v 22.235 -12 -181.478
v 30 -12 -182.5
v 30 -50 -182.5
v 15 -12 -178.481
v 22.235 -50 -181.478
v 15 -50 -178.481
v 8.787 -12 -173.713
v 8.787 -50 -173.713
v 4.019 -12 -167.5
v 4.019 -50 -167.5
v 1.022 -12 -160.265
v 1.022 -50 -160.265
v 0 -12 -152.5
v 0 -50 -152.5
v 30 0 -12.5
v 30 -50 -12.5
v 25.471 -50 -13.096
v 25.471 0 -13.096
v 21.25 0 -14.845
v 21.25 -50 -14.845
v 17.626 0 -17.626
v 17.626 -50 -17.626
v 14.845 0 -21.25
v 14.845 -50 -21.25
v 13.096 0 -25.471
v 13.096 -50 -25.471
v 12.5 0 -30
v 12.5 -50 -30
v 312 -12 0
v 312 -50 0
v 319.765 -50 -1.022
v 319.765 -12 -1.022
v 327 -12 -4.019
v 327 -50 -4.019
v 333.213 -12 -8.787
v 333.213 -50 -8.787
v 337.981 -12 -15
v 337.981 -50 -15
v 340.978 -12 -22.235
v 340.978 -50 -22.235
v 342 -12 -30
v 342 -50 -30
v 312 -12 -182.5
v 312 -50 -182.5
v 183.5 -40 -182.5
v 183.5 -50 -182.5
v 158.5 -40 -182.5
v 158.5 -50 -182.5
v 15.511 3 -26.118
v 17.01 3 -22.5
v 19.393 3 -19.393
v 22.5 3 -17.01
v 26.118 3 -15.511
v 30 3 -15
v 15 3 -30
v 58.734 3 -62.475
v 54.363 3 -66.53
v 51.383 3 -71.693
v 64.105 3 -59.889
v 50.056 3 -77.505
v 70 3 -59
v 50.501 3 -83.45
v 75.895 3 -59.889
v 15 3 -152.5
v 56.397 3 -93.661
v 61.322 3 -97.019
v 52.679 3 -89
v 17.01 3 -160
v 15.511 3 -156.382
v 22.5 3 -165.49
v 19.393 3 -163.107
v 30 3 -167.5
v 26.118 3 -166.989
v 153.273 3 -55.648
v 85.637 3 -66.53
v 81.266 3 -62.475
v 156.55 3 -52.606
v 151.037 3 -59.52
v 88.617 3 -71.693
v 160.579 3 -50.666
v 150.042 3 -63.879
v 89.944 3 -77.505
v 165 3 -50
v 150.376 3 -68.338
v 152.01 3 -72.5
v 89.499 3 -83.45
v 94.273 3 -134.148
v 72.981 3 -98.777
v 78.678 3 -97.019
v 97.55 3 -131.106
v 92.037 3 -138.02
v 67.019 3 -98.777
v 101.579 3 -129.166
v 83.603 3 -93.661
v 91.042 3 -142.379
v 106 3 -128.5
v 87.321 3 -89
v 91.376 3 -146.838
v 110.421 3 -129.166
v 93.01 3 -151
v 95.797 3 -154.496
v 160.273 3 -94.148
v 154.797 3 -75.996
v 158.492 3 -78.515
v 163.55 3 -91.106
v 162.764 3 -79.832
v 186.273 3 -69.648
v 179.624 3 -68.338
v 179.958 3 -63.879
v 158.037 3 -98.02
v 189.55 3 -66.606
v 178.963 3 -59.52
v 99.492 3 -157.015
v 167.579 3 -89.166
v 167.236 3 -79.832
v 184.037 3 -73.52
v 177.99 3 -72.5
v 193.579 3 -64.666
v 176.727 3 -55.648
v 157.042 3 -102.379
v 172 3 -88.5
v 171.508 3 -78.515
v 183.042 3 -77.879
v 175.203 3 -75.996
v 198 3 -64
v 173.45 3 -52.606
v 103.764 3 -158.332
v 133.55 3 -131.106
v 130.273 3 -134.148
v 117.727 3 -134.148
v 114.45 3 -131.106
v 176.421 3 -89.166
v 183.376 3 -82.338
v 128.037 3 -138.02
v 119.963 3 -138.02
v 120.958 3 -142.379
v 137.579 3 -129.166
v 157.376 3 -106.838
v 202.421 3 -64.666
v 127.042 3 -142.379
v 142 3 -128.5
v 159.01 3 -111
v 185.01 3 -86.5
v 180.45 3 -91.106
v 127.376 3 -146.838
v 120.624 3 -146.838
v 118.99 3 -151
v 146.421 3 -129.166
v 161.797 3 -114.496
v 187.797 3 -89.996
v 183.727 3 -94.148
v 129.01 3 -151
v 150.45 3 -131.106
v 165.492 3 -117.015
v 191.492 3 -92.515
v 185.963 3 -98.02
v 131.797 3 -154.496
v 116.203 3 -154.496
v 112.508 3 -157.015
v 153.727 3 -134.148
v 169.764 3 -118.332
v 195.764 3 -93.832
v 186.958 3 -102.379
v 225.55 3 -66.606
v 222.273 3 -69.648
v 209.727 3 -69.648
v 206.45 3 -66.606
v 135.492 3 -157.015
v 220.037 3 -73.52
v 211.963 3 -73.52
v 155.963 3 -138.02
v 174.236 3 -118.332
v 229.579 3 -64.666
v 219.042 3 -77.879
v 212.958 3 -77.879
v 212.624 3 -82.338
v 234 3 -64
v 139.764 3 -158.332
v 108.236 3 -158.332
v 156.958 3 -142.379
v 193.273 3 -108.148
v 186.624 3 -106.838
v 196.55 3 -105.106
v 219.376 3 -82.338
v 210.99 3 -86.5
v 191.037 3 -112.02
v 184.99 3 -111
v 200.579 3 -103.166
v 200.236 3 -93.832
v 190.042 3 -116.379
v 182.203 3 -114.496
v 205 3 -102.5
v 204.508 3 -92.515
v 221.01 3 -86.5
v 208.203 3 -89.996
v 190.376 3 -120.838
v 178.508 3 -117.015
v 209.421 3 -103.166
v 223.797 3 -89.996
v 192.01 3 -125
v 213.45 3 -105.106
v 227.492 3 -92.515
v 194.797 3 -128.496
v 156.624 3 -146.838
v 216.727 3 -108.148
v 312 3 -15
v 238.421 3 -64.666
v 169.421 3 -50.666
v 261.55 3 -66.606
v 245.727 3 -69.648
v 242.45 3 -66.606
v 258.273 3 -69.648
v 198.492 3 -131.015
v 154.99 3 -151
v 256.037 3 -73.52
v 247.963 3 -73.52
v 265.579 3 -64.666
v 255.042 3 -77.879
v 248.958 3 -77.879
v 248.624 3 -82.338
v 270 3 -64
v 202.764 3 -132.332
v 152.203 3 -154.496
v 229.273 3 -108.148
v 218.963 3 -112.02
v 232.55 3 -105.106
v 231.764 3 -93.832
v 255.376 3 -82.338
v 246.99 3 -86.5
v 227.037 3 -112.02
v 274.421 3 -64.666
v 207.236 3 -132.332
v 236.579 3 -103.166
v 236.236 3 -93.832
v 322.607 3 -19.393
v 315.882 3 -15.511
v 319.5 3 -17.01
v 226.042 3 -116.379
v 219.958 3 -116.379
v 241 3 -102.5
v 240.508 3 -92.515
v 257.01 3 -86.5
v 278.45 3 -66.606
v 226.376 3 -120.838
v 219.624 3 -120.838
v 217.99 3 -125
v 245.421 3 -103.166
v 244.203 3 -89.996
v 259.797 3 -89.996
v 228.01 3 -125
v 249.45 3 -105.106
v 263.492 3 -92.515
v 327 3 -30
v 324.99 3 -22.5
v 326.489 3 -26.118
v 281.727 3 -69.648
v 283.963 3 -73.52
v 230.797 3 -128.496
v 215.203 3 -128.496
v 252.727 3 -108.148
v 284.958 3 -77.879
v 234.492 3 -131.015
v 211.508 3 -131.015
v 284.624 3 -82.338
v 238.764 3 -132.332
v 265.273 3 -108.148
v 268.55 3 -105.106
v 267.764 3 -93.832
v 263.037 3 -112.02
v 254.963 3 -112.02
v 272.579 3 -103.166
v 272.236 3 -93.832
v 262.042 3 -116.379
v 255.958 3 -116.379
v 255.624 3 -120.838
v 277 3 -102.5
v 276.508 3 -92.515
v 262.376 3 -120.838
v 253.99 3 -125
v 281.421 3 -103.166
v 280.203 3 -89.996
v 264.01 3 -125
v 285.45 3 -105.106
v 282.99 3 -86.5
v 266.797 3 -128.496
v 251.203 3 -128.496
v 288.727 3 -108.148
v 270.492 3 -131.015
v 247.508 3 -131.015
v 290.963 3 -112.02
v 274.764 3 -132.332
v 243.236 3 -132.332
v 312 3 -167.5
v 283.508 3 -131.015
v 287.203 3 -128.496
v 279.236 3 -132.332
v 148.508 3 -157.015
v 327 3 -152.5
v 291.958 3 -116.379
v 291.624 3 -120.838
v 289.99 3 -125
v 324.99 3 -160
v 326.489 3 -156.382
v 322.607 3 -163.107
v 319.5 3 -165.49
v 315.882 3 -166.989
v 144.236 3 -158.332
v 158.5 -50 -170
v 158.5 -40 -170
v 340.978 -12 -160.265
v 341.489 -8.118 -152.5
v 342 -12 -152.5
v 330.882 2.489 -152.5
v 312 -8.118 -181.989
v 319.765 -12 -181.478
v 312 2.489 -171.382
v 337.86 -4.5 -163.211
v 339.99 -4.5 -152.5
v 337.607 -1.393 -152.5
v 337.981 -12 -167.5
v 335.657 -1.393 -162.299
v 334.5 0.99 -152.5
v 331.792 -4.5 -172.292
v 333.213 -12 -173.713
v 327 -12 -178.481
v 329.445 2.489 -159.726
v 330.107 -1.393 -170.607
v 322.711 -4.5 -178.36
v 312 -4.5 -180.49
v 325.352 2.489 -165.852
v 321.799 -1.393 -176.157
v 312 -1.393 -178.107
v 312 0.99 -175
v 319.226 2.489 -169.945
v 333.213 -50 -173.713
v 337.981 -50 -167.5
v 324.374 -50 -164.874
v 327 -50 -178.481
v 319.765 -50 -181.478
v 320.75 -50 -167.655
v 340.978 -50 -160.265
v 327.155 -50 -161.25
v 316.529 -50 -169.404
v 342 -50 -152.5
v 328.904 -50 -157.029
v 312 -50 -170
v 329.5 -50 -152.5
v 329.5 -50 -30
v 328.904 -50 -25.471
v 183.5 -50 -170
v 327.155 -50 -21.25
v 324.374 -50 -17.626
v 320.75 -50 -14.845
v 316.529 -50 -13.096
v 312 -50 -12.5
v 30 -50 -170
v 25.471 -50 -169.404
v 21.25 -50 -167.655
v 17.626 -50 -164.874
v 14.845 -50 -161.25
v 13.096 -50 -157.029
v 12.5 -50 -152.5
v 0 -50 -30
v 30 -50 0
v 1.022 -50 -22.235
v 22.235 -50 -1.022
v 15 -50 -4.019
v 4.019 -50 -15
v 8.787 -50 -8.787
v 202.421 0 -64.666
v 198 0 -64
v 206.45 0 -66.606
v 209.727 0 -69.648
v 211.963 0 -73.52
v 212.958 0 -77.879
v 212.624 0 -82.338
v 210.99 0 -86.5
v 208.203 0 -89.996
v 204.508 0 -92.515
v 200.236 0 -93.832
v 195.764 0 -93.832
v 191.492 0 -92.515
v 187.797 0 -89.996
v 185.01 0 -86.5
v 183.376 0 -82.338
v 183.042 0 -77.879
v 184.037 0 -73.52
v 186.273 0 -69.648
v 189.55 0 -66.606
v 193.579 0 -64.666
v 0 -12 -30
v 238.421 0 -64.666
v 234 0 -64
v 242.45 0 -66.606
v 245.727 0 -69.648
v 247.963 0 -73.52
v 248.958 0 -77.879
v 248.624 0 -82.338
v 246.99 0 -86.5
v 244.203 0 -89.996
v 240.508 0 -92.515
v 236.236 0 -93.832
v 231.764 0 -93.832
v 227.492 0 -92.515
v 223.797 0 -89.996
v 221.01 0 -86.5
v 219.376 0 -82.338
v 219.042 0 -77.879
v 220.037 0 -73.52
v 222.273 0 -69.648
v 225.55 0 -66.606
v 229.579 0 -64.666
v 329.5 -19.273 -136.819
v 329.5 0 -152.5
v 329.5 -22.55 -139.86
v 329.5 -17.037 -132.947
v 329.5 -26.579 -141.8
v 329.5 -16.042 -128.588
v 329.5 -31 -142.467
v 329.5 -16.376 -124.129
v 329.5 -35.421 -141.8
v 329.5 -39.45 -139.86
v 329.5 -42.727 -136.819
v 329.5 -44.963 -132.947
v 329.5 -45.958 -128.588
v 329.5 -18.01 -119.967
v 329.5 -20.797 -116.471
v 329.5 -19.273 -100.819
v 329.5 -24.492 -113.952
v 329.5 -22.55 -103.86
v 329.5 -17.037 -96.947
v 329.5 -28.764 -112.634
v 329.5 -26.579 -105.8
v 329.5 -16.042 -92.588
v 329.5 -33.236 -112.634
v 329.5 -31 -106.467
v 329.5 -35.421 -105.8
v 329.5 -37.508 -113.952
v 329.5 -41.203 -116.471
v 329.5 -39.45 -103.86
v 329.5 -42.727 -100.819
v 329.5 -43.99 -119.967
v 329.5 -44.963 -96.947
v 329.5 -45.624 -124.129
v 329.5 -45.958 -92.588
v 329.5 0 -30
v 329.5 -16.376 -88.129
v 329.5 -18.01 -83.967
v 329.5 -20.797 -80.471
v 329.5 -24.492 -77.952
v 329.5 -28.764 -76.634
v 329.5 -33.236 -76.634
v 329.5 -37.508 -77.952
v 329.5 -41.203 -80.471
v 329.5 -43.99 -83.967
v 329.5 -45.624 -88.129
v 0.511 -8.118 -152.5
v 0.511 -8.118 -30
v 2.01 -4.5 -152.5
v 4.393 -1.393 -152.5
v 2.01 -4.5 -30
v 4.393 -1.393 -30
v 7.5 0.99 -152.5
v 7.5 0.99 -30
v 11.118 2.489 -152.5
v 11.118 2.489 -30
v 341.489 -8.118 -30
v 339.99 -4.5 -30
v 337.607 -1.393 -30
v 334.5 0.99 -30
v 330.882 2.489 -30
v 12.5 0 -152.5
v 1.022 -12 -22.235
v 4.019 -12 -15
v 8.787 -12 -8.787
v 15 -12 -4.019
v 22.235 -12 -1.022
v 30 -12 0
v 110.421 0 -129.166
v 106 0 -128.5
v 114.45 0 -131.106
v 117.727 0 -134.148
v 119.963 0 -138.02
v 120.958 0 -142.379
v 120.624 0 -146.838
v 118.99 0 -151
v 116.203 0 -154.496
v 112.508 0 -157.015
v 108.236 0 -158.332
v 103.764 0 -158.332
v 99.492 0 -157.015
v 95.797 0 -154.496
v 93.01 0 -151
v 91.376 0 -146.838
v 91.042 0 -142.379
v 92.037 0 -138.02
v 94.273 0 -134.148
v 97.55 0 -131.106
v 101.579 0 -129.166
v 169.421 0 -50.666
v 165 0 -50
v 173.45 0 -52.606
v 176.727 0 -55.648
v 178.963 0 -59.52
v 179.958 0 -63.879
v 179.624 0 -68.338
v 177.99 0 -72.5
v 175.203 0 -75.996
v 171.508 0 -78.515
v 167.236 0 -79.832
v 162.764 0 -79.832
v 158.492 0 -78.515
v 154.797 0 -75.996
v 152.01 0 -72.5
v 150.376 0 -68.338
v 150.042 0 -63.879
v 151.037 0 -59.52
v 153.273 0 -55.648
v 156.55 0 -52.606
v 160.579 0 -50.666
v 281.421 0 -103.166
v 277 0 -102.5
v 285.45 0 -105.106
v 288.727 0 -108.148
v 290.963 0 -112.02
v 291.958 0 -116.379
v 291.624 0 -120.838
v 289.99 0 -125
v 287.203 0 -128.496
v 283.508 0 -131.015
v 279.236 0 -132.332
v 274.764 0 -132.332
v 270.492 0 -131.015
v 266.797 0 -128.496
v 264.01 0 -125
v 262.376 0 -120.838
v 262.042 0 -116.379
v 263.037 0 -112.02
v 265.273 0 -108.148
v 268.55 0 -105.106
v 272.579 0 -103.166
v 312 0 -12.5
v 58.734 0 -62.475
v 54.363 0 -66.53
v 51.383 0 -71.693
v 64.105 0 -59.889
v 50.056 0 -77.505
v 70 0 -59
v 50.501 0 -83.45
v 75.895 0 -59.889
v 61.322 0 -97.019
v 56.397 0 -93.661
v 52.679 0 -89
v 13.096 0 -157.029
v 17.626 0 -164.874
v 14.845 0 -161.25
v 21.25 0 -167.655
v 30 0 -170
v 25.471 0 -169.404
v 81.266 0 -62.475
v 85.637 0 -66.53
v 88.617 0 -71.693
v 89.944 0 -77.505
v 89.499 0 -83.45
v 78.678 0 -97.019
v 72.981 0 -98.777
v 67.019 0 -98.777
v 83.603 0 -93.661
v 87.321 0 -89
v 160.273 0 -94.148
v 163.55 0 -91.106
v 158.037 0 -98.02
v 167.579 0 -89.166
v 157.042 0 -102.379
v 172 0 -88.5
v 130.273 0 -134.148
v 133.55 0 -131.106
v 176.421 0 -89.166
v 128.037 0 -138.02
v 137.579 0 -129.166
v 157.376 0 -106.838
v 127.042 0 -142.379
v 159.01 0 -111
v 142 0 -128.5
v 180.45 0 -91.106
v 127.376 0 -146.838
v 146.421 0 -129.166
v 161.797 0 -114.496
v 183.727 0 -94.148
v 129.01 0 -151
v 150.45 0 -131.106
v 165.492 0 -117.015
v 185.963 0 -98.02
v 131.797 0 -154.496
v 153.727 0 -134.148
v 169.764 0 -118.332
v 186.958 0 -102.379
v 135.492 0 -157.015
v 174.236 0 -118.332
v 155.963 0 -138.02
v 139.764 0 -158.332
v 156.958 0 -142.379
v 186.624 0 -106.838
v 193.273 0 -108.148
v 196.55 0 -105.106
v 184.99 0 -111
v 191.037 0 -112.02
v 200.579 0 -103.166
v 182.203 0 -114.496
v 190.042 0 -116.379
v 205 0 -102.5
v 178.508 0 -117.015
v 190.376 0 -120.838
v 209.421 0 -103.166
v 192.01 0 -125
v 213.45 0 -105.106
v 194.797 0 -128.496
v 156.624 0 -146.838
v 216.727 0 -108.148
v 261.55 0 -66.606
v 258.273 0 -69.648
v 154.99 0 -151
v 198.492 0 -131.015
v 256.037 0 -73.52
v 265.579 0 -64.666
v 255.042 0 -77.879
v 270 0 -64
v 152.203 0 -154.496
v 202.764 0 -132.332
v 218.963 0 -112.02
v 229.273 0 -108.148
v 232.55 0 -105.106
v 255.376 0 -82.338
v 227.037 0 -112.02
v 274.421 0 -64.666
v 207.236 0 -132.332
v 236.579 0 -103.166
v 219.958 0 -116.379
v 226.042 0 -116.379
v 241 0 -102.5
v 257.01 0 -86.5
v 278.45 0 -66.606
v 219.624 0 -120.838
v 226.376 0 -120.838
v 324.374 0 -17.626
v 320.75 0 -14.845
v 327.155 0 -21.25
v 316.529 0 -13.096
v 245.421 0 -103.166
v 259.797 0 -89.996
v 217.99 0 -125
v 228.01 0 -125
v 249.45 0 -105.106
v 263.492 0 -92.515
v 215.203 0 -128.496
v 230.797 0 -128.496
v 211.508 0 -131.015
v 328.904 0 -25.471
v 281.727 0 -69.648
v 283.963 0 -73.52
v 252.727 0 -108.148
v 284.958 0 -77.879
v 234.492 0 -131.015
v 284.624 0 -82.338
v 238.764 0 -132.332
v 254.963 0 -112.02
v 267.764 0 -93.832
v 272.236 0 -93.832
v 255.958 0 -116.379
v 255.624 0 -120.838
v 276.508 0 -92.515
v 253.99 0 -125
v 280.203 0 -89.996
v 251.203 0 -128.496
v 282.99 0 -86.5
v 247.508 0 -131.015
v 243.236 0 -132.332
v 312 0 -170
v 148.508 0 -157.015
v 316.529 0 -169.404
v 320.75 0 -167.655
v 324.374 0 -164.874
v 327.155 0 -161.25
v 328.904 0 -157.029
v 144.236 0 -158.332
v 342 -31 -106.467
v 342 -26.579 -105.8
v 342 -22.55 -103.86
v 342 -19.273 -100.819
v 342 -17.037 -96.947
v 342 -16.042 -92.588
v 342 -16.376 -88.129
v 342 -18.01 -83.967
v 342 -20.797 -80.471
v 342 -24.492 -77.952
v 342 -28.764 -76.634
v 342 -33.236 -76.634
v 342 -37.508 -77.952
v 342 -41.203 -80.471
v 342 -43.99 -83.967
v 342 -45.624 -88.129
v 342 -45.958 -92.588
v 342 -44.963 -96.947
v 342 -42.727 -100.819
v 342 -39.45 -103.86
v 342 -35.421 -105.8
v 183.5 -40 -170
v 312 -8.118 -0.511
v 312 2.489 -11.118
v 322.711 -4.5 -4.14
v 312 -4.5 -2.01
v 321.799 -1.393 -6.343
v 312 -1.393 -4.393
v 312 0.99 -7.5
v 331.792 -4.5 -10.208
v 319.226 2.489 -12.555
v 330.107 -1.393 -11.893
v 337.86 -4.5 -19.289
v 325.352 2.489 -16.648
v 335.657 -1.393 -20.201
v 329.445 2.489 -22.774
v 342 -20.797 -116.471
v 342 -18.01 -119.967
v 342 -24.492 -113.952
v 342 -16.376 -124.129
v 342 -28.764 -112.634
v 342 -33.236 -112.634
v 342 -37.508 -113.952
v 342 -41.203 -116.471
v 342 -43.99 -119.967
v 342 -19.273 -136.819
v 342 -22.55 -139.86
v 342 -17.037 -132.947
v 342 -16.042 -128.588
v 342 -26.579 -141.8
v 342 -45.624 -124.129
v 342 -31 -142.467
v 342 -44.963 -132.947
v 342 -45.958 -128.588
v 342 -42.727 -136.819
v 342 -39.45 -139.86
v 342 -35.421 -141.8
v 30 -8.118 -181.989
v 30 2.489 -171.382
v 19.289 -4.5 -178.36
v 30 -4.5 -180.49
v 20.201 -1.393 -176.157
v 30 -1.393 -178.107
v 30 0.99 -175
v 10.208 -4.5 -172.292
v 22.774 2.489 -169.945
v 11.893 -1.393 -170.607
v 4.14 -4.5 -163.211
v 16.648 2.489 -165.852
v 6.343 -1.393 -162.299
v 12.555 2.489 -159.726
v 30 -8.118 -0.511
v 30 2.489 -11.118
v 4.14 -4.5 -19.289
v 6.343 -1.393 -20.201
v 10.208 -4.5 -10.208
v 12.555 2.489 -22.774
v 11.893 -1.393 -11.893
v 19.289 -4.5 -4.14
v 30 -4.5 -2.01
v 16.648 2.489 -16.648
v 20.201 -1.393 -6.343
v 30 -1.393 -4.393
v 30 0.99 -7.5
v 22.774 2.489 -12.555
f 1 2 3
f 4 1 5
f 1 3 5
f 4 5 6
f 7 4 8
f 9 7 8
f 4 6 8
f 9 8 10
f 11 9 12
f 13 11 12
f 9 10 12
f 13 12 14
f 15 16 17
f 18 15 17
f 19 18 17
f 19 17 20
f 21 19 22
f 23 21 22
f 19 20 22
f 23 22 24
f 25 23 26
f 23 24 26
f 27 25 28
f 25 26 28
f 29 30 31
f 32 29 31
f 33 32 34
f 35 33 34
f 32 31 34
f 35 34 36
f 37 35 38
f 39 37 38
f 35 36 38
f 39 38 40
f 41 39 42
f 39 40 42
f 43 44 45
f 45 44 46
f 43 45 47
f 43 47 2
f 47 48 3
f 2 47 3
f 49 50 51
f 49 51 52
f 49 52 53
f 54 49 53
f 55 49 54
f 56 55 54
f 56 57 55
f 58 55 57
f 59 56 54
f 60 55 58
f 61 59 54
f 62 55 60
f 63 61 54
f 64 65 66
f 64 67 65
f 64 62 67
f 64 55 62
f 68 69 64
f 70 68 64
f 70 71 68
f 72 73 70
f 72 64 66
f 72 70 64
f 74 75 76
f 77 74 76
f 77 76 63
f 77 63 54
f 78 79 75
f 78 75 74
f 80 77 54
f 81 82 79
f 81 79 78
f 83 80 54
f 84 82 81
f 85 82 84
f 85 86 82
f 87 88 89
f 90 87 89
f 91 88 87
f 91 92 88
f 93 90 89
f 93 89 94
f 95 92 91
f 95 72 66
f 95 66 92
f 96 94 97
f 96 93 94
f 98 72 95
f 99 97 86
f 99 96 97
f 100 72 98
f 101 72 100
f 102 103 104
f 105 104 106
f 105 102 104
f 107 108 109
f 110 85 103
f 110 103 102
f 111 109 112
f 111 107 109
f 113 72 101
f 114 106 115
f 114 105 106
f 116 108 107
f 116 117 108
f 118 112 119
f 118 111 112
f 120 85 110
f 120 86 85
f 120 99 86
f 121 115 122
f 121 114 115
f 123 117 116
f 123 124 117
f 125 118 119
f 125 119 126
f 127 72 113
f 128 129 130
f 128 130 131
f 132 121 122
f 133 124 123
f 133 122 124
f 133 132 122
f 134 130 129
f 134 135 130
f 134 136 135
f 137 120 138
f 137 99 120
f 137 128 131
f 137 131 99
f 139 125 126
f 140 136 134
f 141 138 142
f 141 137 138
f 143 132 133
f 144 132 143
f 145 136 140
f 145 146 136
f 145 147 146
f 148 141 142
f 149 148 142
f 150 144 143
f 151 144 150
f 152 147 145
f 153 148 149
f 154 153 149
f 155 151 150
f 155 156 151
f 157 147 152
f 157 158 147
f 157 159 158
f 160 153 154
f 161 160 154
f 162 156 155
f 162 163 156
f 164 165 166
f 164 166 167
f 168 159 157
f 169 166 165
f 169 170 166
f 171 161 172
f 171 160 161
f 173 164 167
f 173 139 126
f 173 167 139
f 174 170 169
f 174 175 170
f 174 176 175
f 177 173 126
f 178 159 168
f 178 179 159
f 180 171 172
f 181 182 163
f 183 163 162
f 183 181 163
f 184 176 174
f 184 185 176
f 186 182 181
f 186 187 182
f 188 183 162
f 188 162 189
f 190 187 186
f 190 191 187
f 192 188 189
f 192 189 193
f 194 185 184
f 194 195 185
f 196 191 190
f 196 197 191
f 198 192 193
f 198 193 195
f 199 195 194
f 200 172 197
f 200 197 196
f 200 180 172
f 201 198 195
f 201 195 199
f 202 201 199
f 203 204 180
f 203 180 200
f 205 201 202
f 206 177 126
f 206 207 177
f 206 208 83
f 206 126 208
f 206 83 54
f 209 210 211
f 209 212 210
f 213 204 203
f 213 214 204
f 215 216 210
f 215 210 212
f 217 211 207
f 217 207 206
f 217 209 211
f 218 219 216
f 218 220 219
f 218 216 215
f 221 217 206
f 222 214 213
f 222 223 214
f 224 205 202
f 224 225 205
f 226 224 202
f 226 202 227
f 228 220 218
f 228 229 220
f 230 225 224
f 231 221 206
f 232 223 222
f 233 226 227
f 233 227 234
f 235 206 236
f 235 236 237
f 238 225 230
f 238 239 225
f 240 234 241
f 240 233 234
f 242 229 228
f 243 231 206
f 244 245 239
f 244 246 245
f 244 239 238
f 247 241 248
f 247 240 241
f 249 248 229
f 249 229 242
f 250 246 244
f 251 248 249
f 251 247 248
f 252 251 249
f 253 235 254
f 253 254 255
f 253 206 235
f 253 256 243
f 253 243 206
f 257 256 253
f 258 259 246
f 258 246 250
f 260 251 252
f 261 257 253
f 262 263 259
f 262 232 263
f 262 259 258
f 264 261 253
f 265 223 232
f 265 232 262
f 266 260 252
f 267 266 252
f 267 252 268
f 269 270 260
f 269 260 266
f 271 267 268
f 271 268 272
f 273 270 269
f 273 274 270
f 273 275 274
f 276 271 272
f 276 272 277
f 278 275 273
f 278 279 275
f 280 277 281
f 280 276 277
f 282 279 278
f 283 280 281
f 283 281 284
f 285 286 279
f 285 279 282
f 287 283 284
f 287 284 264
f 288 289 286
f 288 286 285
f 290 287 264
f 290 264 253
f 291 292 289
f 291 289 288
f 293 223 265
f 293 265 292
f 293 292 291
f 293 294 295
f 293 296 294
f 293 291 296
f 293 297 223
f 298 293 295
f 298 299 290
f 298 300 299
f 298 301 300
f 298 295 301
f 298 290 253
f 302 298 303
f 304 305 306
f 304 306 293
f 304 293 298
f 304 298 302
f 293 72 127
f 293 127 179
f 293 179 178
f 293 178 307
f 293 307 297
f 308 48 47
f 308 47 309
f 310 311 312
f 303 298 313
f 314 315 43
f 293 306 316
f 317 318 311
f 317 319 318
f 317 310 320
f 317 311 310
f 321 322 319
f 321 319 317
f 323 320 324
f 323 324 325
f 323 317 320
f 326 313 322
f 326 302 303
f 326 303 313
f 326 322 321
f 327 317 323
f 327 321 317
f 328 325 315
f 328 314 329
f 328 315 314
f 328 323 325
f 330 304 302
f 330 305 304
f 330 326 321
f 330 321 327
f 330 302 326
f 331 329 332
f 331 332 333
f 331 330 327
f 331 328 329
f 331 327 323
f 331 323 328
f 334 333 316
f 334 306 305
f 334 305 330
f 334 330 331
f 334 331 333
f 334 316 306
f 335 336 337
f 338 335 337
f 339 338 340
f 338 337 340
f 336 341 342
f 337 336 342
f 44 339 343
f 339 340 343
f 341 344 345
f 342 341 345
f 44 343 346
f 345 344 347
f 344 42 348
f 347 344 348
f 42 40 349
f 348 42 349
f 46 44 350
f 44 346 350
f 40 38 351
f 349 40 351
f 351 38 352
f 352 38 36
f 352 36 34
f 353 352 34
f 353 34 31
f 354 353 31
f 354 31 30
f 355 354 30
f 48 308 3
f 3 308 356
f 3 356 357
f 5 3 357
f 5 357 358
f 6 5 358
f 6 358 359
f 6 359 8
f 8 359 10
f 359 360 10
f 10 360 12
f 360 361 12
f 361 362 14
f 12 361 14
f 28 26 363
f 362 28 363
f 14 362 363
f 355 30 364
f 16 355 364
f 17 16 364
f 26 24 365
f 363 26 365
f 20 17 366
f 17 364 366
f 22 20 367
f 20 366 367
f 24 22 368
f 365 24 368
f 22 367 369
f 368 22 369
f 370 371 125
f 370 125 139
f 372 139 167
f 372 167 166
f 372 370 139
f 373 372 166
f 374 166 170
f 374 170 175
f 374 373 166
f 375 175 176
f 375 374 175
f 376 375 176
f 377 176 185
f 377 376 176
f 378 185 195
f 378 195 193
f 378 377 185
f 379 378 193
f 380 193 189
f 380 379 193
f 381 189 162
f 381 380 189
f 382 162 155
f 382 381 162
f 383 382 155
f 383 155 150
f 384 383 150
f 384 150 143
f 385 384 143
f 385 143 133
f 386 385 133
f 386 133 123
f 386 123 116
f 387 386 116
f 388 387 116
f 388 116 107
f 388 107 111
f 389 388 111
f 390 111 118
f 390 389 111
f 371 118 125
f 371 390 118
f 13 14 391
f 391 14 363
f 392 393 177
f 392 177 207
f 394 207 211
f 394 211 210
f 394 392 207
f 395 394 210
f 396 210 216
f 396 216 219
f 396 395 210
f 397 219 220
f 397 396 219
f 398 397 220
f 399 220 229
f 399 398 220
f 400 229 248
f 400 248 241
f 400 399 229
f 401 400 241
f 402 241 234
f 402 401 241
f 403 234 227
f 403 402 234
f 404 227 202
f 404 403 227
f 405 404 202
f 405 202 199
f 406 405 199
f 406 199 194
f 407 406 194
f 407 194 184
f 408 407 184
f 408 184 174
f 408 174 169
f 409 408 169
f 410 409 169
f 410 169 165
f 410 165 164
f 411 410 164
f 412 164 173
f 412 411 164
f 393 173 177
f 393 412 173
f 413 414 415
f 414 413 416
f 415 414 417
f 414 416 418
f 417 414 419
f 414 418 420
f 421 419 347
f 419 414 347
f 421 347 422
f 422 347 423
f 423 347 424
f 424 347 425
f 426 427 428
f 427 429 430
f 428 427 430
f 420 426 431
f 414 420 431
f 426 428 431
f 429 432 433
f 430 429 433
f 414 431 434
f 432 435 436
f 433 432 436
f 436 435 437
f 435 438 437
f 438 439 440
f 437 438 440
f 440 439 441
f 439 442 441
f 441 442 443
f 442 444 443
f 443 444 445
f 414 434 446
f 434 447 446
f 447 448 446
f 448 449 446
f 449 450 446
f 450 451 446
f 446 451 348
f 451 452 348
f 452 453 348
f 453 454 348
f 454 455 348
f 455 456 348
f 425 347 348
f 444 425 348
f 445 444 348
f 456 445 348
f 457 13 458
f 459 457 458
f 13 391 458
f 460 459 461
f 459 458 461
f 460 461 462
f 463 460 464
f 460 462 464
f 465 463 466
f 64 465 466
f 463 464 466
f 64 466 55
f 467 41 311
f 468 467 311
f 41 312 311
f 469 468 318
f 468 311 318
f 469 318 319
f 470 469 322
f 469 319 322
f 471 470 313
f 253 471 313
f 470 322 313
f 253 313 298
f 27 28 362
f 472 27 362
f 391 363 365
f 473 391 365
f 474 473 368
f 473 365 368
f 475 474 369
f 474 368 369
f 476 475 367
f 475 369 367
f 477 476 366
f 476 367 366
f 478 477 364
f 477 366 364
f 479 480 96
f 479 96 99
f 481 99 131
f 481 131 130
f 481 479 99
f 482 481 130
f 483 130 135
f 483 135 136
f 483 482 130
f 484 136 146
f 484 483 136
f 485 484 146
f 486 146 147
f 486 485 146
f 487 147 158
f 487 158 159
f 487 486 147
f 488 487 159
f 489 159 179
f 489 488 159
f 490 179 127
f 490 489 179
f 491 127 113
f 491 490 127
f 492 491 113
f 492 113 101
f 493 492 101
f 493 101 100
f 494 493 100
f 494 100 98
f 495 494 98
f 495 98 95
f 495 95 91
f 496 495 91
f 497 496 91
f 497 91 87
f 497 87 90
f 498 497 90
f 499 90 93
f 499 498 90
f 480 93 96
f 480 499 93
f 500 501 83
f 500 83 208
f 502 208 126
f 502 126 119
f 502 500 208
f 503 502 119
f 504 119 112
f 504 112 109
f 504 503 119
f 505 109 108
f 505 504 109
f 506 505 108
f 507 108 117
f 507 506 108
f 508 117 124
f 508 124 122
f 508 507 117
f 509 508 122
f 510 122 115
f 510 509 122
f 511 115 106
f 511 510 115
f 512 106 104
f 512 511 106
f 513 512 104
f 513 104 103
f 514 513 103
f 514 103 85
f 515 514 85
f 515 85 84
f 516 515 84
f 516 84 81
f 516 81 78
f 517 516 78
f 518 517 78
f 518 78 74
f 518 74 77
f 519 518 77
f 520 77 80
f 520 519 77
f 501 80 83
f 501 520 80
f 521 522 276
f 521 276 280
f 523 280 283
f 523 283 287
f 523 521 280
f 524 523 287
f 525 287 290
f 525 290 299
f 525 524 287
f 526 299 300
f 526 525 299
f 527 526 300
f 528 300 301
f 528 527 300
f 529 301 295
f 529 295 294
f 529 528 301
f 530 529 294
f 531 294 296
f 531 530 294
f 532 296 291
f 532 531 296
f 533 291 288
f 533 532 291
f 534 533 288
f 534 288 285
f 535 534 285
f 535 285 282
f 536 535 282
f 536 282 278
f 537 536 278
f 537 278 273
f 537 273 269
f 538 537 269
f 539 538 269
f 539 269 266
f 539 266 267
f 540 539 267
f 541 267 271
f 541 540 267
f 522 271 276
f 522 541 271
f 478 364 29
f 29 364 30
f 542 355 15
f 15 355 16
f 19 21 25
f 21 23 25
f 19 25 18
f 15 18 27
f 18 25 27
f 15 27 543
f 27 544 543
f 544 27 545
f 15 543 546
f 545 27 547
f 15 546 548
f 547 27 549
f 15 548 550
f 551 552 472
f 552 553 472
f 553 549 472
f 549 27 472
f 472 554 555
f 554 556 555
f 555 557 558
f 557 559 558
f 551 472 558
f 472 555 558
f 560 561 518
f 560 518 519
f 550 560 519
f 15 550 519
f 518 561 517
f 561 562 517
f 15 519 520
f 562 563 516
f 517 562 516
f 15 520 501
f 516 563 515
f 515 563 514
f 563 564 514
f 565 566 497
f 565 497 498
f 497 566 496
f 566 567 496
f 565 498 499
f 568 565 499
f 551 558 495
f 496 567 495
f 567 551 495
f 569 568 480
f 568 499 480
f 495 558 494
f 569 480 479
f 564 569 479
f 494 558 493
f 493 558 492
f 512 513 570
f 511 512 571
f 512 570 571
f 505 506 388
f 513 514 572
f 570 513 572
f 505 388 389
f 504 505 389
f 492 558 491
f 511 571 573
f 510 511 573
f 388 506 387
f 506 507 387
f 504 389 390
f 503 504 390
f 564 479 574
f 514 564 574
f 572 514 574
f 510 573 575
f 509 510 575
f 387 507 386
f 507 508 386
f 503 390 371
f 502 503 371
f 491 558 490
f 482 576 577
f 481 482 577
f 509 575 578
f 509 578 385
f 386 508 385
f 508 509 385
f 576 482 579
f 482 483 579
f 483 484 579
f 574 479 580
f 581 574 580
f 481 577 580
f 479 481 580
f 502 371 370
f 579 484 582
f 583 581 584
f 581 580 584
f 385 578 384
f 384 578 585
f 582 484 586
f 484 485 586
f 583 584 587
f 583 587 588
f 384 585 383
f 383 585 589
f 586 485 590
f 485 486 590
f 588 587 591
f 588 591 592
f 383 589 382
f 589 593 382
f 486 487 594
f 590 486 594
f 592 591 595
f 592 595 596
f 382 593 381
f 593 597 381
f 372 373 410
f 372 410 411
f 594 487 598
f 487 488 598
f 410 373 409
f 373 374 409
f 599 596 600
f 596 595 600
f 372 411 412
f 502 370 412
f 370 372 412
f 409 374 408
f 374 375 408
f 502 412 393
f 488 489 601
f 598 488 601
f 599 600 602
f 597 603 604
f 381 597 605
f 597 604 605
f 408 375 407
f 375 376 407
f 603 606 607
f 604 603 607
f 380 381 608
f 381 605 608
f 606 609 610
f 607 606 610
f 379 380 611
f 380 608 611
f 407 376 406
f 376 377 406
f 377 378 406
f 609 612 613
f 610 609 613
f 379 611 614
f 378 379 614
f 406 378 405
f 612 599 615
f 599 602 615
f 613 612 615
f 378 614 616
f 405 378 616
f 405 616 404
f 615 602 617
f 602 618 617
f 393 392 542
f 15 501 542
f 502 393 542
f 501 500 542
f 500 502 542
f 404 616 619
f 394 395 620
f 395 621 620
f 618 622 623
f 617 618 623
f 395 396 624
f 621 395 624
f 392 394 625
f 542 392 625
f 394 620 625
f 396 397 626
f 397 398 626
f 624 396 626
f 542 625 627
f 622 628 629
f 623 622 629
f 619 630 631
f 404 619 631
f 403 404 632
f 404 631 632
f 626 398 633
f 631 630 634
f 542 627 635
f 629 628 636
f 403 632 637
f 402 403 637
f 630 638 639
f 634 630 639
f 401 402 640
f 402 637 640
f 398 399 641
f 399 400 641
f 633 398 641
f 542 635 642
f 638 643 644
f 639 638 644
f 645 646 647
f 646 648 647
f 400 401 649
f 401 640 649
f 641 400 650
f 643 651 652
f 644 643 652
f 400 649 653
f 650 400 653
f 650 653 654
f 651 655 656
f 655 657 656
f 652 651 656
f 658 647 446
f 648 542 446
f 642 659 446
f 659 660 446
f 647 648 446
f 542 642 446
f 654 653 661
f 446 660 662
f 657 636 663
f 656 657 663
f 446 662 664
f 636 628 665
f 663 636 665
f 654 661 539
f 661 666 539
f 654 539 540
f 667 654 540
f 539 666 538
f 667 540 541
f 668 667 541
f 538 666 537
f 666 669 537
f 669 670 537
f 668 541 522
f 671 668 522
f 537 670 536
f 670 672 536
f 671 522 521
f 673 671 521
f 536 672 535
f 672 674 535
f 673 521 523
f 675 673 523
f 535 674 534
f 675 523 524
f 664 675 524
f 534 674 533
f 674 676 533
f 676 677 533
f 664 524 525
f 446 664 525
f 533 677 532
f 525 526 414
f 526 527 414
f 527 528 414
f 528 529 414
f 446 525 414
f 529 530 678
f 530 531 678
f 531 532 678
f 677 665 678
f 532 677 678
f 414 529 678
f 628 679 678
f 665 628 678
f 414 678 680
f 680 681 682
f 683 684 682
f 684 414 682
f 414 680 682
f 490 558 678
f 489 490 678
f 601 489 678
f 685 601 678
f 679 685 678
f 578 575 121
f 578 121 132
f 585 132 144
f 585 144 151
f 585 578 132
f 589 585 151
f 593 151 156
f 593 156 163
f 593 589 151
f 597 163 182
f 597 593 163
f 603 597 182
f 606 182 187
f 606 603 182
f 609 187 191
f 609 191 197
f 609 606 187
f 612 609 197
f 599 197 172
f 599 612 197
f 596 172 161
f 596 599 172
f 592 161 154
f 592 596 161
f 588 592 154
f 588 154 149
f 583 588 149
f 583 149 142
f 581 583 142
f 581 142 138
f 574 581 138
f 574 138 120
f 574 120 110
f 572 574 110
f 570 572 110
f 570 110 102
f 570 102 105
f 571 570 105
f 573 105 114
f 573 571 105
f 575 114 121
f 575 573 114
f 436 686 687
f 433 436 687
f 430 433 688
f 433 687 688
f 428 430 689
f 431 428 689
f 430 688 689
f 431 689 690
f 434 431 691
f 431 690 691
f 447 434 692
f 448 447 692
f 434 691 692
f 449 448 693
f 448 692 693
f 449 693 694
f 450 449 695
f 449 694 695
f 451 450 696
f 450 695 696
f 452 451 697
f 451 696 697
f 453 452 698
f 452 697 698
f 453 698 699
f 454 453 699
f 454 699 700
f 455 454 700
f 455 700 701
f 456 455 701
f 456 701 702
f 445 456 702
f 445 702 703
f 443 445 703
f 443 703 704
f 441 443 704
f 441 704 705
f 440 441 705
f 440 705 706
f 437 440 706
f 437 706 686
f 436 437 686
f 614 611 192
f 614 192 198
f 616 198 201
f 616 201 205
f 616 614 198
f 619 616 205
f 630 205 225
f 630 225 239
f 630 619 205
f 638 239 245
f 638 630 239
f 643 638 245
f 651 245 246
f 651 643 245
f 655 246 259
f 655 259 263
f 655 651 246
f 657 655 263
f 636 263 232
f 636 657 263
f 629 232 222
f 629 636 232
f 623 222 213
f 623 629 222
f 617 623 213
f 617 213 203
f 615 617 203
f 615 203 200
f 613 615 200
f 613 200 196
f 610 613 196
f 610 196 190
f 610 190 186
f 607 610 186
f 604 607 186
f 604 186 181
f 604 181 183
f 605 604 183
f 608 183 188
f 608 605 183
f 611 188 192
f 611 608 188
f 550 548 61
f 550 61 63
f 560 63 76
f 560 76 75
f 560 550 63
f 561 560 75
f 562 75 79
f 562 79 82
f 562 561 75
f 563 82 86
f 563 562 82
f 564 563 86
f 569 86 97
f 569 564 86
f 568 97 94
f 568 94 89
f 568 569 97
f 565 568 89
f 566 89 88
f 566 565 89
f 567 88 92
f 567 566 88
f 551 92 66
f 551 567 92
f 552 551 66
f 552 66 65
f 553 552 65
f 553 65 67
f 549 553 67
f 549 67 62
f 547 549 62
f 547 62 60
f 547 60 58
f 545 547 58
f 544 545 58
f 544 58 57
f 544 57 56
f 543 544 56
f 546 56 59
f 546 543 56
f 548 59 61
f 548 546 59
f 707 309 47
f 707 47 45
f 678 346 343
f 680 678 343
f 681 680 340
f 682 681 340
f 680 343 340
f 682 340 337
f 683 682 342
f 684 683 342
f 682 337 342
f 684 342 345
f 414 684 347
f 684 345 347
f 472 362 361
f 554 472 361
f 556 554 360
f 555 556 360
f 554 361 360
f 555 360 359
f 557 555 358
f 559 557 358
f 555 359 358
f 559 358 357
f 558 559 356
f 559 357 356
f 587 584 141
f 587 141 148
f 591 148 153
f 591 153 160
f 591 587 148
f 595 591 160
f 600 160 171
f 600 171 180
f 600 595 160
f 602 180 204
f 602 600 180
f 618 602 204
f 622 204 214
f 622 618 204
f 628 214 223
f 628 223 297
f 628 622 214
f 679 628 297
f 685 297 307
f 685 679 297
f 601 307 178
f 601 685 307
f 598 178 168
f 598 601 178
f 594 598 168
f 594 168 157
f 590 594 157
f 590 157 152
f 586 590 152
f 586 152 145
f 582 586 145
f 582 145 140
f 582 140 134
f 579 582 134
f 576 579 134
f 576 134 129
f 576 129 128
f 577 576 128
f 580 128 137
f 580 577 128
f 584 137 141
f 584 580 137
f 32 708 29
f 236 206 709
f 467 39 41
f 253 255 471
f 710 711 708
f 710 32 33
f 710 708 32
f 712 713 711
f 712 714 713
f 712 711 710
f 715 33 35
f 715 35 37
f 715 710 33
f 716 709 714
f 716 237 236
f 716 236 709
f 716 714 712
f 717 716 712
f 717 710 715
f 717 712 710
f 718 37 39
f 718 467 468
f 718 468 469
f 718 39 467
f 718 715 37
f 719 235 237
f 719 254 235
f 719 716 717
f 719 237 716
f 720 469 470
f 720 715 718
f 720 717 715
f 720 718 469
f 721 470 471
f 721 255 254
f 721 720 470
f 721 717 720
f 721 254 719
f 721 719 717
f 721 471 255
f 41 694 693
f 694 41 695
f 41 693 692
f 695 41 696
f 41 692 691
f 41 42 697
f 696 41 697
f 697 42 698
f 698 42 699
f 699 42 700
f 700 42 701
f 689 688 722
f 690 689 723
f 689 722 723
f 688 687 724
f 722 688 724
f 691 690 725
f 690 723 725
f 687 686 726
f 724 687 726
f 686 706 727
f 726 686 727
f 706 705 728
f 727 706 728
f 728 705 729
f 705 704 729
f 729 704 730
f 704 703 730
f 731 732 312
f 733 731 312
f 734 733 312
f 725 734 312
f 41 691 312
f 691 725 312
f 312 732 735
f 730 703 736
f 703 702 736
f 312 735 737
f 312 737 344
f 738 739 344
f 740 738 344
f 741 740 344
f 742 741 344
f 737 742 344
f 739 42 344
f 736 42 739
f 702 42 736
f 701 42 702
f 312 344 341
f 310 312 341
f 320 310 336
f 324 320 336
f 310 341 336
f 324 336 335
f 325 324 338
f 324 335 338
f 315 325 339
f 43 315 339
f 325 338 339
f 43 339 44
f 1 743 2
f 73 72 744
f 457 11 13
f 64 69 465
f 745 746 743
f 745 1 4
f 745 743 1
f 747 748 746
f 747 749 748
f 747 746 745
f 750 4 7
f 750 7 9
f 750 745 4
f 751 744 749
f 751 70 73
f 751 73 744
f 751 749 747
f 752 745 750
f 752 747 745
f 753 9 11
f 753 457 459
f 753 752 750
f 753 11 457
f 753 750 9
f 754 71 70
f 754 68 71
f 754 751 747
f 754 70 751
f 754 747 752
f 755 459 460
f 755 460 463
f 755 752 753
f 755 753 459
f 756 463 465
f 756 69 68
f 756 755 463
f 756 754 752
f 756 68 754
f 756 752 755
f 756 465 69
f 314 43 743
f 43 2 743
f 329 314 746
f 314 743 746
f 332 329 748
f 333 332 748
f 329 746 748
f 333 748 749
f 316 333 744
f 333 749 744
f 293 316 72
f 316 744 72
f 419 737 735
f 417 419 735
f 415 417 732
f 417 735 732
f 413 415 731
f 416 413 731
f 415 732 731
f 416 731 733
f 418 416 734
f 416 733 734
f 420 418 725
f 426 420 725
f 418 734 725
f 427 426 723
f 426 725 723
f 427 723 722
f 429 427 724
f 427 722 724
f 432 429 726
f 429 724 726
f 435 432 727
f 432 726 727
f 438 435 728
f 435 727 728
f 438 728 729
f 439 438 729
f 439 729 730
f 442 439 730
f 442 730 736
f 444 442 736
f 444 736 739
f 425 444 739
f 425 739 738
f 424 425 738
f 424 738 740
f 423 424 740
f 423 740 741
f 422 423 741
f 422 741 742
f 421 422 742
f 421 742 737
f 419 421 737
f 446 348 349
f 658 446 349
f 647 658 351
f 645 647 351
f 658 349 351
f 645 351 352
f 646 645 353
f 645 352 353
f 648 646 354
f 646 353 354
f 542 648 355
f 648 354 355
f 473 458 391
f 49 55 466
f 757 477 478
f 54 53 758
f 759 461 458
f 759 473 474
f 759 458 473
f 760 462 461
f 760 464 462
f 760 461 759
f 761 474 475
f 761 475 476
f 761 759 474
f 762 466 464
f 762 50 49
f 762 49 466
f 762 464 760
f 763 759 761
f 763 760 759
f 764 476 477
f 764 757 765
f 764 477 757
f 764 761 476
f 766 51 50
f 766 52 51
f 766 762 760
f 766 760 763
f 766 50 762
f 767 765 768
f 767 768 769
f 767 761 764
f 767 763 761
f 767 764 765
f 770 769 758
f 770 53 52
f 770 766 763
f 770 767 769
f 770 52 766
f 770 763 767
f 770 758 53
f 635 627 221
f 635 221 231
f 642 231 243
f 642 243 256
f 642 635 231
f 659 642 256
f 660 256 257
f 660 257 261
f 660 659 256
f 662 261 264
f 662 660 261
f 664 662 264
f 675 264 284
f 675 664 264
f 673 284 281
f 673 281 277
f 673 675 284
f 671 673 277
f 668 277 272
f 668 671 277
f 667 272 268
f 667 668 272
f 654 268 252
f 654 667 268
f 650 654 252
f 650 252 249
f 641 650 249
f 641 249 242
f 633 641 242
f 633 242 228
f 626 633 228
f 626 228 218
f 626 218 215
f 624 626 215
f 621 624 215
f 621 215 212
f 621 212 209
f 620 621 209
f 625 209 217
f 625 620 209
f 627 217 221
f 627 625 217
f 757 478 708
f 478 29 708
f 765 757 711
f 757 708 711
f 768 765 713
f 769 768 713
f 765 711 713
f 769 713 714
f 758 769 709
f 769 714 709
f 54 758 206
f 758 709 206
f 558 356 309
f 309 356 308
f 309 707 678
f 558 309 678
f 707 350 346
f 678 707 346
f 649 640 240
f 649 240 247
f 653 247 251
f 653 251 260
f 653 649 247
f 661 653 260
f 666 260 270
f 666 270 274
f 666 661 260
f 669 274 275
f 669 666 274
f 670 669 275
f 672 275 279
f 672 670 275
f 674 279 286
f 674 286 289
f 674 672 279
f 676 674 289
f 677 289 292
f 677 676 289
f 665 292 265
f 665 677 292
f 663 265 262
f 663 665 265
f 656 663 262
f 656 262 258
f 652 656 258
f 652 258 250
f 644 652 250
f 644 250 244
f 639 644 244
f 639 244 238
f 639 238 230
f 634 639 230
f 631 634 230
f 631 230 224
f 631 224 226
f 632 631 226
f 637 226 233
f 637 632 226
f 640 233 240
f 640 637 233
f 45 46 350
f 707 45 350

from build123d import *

# Parameters (mm, degrees)
SKETCH1_R           = 15
SKETCH1_R_2         = 20
BOSS_EXTRUDE2_DEPTH = 3
BOSS_EXTRUDE4_START = 50
BOSS_EXTRUDE4_DEPTH = 50
SKETCH4_W           = 25
SKETCH4_H           = 12.5
CUT_EXTRUDE1_DEPTH  = 10
FILLET1_R           = 15
SKETCH6_R           = 15
CUT_EXTRUDE2_DEPTH  = 40


with BuildPart() as part:
    # Sketch1 → Boss-Extrude2 (new body)
    with BuildSketch(Plane(origin=(0, 0, 0), x_dir=(1, 0, 0), z_dir=(0, 1, 0))):
        with BuildLine():
            Line((30, 0), (312, 0))
            ThreePointArc((312, 0), (333.213203436, 8.786796564), (342, 30))
            Line((342, 30), (342, 152.5))
            ThreePointArc((342, 152.5), (333.213203436, 173.713203436), (312, 182.5))
            Line((312, 182.5), (30, 182.5))
            ThreePointArc((30, 182.5), (8.786796564, 173.713203436), (0, 152.5))
            Line((0, 152.5), (0, 30))
            ThreePointArc((0, 30), (8.786796564, 8.786796564), (30, 0))
        make_face()
        with Locations(Location((165, 65, 0), (0, 0, 270))):
            Circle(SKETCH1_R, mode=Mode.SUBTRACT)
        with Locations(Location((172, 103.5, 0), (0, 0, 270))):
            Circle(SKETCH1_R, mode=Mode.SUBTRACT)
        with Locations(Location((198, 79, 0), (0, 0, 270))):
            Circle(SKETCH1_R, mode=Mode.SUBTRACT)
        with Locations(Location((205, 117.5, 0), (0, 0, 270))):
            Circle(SKETCH1_R, mode=Mode.SUBTRACT)
        with Locations(Location((234, 79, 0), (0, 0, 270))):
            Circle(SKETCH1_R, mode=Mode.SUBTRACT)
        with Locations(Location((241, 117.5, 0), (0, 0, 270))):
            Circle(SKETCH1_R, mode=Mode.SUBTRACT)
        with Locations(Location((270, 79, 0), (0, 0, 270))):
            Circle(SKETCH1_R, mode=Mode.SUBTRACT)
        with Locations(Location((277, 117.5, 0), (0, 0, 270))):
            Circle(SKETCH1_R, mode=Mode.SUBTRACT)
        with Locations(Location((70, 79, 0), (0, 0, 270))):
            Circle(SKETCH1_R_2, mode=Mode.SUBTRACT)
        with Locations(Location((106, 143.5, 0), (0, 0, 270))):
            Circle(SKETCH1_R, mode=Mode.SUBTRACT)
        with Locations(Location((142, 143.5, 0), (0, 0, 270))):
            Circle(SKETCH1_R, mode=Mode.SUBTRACT)
    extrude(amount=BOSS_EXTRUDE2_DEPTH)

    # Sketch2 → Boss-Extrude4 (add)
    with BuildSketch(Plane.XZ.offset(BOSS_EXTRUDE4_START)):
        with BuildLine():
            Line((30, 0), (312, 0))
            ThreePointArc((312, 0), (333.213203436, -8.786796564), (342, -30))
            Line((342, -30), (342, -152.5))
            ThreePointArc((342, -152.5), (333.213203436, -173.713203436), (312, -182.5))
            Line((312, -182.5), (30, -182.5))
            ThreePointArc((30, -182.5), (8.786796564, -173.713203436), (0, -152.5))
            Line((0, -152.5), (0, -30))
            ThreePointArc((0, -30), (8.786796564, -8.786796564), (30, 0))
        make_face()
        with BuildLine():
            Line((12.5, -30), (12.5, -152.5))
            ThreePointArc((12.5, -152.5), (17.625631329, -164.874368671), (30, -170))
            Line((30, -170), (312, -170))
            ThreePointArc((312, -170), (324.374368671, -164.874368671), (329.5, -152.5))
            Line((329.5, -152.5), (329.5, -30))
            ThreePointArc((329.5, -30), (324.374368671, -17.625631329), (312, -12.5))
            Line((312, -12.5), (30, -12.5))
            ThreePointArc((30, -12.5), (17.625631329, -17.625631329), (12.5, -30))
        make_face(mode=Mode.SUBTRACT)
    extrude(amount=-BOSS_EXTRUDE4_DEPTH)

    # Sketch4 → Cut-Extrude1 (cut)
    with BuildSketch(Plane.XZ.offset(50)):
        with Locations((171, -176.25)):
            Rectangle(SKETCH4_W, SKETCH4_H)
    extrude(amount=-CUT_EXTRUDE1_DEPTH, mode=Mode.SUBTRACT)

    # Fillet1
    fillet1_edges = [part.edges().sort_by_distance(p)[0] for p in [
        (8.786796564, 3, -8.786796564),
        (171, 3, 0),
        (333.213203436, 3, -8.786796564),
        (342, 3, -91.25),
        (333.213203436, 3, -173.713203436),
        (171, 3, -182.5),
        (8.786796564, 3, -173.713203436),
        (0, 3, -91.25),
    ]]
    fillet(fillet1_edges, radius=FILLET1_R)

    # Sketch6 → Cut-Extrude2 (cut)
    with BuildSketch(Plane(origin=(342, 0, 0), x_dir=(0, 0, -1), z_dir=(1, 0, 0))):
        with Locations((127.466870265, -31)):
            Circle(SKETCH6_R)
        with Locations((91.466870265, -31)):
            Circle(SKETCH6_R)
    extrude(amount=-CUT_EXTRUDE2_DEPTH, mode=Mode.SUBTRACT)


solid = part.part
